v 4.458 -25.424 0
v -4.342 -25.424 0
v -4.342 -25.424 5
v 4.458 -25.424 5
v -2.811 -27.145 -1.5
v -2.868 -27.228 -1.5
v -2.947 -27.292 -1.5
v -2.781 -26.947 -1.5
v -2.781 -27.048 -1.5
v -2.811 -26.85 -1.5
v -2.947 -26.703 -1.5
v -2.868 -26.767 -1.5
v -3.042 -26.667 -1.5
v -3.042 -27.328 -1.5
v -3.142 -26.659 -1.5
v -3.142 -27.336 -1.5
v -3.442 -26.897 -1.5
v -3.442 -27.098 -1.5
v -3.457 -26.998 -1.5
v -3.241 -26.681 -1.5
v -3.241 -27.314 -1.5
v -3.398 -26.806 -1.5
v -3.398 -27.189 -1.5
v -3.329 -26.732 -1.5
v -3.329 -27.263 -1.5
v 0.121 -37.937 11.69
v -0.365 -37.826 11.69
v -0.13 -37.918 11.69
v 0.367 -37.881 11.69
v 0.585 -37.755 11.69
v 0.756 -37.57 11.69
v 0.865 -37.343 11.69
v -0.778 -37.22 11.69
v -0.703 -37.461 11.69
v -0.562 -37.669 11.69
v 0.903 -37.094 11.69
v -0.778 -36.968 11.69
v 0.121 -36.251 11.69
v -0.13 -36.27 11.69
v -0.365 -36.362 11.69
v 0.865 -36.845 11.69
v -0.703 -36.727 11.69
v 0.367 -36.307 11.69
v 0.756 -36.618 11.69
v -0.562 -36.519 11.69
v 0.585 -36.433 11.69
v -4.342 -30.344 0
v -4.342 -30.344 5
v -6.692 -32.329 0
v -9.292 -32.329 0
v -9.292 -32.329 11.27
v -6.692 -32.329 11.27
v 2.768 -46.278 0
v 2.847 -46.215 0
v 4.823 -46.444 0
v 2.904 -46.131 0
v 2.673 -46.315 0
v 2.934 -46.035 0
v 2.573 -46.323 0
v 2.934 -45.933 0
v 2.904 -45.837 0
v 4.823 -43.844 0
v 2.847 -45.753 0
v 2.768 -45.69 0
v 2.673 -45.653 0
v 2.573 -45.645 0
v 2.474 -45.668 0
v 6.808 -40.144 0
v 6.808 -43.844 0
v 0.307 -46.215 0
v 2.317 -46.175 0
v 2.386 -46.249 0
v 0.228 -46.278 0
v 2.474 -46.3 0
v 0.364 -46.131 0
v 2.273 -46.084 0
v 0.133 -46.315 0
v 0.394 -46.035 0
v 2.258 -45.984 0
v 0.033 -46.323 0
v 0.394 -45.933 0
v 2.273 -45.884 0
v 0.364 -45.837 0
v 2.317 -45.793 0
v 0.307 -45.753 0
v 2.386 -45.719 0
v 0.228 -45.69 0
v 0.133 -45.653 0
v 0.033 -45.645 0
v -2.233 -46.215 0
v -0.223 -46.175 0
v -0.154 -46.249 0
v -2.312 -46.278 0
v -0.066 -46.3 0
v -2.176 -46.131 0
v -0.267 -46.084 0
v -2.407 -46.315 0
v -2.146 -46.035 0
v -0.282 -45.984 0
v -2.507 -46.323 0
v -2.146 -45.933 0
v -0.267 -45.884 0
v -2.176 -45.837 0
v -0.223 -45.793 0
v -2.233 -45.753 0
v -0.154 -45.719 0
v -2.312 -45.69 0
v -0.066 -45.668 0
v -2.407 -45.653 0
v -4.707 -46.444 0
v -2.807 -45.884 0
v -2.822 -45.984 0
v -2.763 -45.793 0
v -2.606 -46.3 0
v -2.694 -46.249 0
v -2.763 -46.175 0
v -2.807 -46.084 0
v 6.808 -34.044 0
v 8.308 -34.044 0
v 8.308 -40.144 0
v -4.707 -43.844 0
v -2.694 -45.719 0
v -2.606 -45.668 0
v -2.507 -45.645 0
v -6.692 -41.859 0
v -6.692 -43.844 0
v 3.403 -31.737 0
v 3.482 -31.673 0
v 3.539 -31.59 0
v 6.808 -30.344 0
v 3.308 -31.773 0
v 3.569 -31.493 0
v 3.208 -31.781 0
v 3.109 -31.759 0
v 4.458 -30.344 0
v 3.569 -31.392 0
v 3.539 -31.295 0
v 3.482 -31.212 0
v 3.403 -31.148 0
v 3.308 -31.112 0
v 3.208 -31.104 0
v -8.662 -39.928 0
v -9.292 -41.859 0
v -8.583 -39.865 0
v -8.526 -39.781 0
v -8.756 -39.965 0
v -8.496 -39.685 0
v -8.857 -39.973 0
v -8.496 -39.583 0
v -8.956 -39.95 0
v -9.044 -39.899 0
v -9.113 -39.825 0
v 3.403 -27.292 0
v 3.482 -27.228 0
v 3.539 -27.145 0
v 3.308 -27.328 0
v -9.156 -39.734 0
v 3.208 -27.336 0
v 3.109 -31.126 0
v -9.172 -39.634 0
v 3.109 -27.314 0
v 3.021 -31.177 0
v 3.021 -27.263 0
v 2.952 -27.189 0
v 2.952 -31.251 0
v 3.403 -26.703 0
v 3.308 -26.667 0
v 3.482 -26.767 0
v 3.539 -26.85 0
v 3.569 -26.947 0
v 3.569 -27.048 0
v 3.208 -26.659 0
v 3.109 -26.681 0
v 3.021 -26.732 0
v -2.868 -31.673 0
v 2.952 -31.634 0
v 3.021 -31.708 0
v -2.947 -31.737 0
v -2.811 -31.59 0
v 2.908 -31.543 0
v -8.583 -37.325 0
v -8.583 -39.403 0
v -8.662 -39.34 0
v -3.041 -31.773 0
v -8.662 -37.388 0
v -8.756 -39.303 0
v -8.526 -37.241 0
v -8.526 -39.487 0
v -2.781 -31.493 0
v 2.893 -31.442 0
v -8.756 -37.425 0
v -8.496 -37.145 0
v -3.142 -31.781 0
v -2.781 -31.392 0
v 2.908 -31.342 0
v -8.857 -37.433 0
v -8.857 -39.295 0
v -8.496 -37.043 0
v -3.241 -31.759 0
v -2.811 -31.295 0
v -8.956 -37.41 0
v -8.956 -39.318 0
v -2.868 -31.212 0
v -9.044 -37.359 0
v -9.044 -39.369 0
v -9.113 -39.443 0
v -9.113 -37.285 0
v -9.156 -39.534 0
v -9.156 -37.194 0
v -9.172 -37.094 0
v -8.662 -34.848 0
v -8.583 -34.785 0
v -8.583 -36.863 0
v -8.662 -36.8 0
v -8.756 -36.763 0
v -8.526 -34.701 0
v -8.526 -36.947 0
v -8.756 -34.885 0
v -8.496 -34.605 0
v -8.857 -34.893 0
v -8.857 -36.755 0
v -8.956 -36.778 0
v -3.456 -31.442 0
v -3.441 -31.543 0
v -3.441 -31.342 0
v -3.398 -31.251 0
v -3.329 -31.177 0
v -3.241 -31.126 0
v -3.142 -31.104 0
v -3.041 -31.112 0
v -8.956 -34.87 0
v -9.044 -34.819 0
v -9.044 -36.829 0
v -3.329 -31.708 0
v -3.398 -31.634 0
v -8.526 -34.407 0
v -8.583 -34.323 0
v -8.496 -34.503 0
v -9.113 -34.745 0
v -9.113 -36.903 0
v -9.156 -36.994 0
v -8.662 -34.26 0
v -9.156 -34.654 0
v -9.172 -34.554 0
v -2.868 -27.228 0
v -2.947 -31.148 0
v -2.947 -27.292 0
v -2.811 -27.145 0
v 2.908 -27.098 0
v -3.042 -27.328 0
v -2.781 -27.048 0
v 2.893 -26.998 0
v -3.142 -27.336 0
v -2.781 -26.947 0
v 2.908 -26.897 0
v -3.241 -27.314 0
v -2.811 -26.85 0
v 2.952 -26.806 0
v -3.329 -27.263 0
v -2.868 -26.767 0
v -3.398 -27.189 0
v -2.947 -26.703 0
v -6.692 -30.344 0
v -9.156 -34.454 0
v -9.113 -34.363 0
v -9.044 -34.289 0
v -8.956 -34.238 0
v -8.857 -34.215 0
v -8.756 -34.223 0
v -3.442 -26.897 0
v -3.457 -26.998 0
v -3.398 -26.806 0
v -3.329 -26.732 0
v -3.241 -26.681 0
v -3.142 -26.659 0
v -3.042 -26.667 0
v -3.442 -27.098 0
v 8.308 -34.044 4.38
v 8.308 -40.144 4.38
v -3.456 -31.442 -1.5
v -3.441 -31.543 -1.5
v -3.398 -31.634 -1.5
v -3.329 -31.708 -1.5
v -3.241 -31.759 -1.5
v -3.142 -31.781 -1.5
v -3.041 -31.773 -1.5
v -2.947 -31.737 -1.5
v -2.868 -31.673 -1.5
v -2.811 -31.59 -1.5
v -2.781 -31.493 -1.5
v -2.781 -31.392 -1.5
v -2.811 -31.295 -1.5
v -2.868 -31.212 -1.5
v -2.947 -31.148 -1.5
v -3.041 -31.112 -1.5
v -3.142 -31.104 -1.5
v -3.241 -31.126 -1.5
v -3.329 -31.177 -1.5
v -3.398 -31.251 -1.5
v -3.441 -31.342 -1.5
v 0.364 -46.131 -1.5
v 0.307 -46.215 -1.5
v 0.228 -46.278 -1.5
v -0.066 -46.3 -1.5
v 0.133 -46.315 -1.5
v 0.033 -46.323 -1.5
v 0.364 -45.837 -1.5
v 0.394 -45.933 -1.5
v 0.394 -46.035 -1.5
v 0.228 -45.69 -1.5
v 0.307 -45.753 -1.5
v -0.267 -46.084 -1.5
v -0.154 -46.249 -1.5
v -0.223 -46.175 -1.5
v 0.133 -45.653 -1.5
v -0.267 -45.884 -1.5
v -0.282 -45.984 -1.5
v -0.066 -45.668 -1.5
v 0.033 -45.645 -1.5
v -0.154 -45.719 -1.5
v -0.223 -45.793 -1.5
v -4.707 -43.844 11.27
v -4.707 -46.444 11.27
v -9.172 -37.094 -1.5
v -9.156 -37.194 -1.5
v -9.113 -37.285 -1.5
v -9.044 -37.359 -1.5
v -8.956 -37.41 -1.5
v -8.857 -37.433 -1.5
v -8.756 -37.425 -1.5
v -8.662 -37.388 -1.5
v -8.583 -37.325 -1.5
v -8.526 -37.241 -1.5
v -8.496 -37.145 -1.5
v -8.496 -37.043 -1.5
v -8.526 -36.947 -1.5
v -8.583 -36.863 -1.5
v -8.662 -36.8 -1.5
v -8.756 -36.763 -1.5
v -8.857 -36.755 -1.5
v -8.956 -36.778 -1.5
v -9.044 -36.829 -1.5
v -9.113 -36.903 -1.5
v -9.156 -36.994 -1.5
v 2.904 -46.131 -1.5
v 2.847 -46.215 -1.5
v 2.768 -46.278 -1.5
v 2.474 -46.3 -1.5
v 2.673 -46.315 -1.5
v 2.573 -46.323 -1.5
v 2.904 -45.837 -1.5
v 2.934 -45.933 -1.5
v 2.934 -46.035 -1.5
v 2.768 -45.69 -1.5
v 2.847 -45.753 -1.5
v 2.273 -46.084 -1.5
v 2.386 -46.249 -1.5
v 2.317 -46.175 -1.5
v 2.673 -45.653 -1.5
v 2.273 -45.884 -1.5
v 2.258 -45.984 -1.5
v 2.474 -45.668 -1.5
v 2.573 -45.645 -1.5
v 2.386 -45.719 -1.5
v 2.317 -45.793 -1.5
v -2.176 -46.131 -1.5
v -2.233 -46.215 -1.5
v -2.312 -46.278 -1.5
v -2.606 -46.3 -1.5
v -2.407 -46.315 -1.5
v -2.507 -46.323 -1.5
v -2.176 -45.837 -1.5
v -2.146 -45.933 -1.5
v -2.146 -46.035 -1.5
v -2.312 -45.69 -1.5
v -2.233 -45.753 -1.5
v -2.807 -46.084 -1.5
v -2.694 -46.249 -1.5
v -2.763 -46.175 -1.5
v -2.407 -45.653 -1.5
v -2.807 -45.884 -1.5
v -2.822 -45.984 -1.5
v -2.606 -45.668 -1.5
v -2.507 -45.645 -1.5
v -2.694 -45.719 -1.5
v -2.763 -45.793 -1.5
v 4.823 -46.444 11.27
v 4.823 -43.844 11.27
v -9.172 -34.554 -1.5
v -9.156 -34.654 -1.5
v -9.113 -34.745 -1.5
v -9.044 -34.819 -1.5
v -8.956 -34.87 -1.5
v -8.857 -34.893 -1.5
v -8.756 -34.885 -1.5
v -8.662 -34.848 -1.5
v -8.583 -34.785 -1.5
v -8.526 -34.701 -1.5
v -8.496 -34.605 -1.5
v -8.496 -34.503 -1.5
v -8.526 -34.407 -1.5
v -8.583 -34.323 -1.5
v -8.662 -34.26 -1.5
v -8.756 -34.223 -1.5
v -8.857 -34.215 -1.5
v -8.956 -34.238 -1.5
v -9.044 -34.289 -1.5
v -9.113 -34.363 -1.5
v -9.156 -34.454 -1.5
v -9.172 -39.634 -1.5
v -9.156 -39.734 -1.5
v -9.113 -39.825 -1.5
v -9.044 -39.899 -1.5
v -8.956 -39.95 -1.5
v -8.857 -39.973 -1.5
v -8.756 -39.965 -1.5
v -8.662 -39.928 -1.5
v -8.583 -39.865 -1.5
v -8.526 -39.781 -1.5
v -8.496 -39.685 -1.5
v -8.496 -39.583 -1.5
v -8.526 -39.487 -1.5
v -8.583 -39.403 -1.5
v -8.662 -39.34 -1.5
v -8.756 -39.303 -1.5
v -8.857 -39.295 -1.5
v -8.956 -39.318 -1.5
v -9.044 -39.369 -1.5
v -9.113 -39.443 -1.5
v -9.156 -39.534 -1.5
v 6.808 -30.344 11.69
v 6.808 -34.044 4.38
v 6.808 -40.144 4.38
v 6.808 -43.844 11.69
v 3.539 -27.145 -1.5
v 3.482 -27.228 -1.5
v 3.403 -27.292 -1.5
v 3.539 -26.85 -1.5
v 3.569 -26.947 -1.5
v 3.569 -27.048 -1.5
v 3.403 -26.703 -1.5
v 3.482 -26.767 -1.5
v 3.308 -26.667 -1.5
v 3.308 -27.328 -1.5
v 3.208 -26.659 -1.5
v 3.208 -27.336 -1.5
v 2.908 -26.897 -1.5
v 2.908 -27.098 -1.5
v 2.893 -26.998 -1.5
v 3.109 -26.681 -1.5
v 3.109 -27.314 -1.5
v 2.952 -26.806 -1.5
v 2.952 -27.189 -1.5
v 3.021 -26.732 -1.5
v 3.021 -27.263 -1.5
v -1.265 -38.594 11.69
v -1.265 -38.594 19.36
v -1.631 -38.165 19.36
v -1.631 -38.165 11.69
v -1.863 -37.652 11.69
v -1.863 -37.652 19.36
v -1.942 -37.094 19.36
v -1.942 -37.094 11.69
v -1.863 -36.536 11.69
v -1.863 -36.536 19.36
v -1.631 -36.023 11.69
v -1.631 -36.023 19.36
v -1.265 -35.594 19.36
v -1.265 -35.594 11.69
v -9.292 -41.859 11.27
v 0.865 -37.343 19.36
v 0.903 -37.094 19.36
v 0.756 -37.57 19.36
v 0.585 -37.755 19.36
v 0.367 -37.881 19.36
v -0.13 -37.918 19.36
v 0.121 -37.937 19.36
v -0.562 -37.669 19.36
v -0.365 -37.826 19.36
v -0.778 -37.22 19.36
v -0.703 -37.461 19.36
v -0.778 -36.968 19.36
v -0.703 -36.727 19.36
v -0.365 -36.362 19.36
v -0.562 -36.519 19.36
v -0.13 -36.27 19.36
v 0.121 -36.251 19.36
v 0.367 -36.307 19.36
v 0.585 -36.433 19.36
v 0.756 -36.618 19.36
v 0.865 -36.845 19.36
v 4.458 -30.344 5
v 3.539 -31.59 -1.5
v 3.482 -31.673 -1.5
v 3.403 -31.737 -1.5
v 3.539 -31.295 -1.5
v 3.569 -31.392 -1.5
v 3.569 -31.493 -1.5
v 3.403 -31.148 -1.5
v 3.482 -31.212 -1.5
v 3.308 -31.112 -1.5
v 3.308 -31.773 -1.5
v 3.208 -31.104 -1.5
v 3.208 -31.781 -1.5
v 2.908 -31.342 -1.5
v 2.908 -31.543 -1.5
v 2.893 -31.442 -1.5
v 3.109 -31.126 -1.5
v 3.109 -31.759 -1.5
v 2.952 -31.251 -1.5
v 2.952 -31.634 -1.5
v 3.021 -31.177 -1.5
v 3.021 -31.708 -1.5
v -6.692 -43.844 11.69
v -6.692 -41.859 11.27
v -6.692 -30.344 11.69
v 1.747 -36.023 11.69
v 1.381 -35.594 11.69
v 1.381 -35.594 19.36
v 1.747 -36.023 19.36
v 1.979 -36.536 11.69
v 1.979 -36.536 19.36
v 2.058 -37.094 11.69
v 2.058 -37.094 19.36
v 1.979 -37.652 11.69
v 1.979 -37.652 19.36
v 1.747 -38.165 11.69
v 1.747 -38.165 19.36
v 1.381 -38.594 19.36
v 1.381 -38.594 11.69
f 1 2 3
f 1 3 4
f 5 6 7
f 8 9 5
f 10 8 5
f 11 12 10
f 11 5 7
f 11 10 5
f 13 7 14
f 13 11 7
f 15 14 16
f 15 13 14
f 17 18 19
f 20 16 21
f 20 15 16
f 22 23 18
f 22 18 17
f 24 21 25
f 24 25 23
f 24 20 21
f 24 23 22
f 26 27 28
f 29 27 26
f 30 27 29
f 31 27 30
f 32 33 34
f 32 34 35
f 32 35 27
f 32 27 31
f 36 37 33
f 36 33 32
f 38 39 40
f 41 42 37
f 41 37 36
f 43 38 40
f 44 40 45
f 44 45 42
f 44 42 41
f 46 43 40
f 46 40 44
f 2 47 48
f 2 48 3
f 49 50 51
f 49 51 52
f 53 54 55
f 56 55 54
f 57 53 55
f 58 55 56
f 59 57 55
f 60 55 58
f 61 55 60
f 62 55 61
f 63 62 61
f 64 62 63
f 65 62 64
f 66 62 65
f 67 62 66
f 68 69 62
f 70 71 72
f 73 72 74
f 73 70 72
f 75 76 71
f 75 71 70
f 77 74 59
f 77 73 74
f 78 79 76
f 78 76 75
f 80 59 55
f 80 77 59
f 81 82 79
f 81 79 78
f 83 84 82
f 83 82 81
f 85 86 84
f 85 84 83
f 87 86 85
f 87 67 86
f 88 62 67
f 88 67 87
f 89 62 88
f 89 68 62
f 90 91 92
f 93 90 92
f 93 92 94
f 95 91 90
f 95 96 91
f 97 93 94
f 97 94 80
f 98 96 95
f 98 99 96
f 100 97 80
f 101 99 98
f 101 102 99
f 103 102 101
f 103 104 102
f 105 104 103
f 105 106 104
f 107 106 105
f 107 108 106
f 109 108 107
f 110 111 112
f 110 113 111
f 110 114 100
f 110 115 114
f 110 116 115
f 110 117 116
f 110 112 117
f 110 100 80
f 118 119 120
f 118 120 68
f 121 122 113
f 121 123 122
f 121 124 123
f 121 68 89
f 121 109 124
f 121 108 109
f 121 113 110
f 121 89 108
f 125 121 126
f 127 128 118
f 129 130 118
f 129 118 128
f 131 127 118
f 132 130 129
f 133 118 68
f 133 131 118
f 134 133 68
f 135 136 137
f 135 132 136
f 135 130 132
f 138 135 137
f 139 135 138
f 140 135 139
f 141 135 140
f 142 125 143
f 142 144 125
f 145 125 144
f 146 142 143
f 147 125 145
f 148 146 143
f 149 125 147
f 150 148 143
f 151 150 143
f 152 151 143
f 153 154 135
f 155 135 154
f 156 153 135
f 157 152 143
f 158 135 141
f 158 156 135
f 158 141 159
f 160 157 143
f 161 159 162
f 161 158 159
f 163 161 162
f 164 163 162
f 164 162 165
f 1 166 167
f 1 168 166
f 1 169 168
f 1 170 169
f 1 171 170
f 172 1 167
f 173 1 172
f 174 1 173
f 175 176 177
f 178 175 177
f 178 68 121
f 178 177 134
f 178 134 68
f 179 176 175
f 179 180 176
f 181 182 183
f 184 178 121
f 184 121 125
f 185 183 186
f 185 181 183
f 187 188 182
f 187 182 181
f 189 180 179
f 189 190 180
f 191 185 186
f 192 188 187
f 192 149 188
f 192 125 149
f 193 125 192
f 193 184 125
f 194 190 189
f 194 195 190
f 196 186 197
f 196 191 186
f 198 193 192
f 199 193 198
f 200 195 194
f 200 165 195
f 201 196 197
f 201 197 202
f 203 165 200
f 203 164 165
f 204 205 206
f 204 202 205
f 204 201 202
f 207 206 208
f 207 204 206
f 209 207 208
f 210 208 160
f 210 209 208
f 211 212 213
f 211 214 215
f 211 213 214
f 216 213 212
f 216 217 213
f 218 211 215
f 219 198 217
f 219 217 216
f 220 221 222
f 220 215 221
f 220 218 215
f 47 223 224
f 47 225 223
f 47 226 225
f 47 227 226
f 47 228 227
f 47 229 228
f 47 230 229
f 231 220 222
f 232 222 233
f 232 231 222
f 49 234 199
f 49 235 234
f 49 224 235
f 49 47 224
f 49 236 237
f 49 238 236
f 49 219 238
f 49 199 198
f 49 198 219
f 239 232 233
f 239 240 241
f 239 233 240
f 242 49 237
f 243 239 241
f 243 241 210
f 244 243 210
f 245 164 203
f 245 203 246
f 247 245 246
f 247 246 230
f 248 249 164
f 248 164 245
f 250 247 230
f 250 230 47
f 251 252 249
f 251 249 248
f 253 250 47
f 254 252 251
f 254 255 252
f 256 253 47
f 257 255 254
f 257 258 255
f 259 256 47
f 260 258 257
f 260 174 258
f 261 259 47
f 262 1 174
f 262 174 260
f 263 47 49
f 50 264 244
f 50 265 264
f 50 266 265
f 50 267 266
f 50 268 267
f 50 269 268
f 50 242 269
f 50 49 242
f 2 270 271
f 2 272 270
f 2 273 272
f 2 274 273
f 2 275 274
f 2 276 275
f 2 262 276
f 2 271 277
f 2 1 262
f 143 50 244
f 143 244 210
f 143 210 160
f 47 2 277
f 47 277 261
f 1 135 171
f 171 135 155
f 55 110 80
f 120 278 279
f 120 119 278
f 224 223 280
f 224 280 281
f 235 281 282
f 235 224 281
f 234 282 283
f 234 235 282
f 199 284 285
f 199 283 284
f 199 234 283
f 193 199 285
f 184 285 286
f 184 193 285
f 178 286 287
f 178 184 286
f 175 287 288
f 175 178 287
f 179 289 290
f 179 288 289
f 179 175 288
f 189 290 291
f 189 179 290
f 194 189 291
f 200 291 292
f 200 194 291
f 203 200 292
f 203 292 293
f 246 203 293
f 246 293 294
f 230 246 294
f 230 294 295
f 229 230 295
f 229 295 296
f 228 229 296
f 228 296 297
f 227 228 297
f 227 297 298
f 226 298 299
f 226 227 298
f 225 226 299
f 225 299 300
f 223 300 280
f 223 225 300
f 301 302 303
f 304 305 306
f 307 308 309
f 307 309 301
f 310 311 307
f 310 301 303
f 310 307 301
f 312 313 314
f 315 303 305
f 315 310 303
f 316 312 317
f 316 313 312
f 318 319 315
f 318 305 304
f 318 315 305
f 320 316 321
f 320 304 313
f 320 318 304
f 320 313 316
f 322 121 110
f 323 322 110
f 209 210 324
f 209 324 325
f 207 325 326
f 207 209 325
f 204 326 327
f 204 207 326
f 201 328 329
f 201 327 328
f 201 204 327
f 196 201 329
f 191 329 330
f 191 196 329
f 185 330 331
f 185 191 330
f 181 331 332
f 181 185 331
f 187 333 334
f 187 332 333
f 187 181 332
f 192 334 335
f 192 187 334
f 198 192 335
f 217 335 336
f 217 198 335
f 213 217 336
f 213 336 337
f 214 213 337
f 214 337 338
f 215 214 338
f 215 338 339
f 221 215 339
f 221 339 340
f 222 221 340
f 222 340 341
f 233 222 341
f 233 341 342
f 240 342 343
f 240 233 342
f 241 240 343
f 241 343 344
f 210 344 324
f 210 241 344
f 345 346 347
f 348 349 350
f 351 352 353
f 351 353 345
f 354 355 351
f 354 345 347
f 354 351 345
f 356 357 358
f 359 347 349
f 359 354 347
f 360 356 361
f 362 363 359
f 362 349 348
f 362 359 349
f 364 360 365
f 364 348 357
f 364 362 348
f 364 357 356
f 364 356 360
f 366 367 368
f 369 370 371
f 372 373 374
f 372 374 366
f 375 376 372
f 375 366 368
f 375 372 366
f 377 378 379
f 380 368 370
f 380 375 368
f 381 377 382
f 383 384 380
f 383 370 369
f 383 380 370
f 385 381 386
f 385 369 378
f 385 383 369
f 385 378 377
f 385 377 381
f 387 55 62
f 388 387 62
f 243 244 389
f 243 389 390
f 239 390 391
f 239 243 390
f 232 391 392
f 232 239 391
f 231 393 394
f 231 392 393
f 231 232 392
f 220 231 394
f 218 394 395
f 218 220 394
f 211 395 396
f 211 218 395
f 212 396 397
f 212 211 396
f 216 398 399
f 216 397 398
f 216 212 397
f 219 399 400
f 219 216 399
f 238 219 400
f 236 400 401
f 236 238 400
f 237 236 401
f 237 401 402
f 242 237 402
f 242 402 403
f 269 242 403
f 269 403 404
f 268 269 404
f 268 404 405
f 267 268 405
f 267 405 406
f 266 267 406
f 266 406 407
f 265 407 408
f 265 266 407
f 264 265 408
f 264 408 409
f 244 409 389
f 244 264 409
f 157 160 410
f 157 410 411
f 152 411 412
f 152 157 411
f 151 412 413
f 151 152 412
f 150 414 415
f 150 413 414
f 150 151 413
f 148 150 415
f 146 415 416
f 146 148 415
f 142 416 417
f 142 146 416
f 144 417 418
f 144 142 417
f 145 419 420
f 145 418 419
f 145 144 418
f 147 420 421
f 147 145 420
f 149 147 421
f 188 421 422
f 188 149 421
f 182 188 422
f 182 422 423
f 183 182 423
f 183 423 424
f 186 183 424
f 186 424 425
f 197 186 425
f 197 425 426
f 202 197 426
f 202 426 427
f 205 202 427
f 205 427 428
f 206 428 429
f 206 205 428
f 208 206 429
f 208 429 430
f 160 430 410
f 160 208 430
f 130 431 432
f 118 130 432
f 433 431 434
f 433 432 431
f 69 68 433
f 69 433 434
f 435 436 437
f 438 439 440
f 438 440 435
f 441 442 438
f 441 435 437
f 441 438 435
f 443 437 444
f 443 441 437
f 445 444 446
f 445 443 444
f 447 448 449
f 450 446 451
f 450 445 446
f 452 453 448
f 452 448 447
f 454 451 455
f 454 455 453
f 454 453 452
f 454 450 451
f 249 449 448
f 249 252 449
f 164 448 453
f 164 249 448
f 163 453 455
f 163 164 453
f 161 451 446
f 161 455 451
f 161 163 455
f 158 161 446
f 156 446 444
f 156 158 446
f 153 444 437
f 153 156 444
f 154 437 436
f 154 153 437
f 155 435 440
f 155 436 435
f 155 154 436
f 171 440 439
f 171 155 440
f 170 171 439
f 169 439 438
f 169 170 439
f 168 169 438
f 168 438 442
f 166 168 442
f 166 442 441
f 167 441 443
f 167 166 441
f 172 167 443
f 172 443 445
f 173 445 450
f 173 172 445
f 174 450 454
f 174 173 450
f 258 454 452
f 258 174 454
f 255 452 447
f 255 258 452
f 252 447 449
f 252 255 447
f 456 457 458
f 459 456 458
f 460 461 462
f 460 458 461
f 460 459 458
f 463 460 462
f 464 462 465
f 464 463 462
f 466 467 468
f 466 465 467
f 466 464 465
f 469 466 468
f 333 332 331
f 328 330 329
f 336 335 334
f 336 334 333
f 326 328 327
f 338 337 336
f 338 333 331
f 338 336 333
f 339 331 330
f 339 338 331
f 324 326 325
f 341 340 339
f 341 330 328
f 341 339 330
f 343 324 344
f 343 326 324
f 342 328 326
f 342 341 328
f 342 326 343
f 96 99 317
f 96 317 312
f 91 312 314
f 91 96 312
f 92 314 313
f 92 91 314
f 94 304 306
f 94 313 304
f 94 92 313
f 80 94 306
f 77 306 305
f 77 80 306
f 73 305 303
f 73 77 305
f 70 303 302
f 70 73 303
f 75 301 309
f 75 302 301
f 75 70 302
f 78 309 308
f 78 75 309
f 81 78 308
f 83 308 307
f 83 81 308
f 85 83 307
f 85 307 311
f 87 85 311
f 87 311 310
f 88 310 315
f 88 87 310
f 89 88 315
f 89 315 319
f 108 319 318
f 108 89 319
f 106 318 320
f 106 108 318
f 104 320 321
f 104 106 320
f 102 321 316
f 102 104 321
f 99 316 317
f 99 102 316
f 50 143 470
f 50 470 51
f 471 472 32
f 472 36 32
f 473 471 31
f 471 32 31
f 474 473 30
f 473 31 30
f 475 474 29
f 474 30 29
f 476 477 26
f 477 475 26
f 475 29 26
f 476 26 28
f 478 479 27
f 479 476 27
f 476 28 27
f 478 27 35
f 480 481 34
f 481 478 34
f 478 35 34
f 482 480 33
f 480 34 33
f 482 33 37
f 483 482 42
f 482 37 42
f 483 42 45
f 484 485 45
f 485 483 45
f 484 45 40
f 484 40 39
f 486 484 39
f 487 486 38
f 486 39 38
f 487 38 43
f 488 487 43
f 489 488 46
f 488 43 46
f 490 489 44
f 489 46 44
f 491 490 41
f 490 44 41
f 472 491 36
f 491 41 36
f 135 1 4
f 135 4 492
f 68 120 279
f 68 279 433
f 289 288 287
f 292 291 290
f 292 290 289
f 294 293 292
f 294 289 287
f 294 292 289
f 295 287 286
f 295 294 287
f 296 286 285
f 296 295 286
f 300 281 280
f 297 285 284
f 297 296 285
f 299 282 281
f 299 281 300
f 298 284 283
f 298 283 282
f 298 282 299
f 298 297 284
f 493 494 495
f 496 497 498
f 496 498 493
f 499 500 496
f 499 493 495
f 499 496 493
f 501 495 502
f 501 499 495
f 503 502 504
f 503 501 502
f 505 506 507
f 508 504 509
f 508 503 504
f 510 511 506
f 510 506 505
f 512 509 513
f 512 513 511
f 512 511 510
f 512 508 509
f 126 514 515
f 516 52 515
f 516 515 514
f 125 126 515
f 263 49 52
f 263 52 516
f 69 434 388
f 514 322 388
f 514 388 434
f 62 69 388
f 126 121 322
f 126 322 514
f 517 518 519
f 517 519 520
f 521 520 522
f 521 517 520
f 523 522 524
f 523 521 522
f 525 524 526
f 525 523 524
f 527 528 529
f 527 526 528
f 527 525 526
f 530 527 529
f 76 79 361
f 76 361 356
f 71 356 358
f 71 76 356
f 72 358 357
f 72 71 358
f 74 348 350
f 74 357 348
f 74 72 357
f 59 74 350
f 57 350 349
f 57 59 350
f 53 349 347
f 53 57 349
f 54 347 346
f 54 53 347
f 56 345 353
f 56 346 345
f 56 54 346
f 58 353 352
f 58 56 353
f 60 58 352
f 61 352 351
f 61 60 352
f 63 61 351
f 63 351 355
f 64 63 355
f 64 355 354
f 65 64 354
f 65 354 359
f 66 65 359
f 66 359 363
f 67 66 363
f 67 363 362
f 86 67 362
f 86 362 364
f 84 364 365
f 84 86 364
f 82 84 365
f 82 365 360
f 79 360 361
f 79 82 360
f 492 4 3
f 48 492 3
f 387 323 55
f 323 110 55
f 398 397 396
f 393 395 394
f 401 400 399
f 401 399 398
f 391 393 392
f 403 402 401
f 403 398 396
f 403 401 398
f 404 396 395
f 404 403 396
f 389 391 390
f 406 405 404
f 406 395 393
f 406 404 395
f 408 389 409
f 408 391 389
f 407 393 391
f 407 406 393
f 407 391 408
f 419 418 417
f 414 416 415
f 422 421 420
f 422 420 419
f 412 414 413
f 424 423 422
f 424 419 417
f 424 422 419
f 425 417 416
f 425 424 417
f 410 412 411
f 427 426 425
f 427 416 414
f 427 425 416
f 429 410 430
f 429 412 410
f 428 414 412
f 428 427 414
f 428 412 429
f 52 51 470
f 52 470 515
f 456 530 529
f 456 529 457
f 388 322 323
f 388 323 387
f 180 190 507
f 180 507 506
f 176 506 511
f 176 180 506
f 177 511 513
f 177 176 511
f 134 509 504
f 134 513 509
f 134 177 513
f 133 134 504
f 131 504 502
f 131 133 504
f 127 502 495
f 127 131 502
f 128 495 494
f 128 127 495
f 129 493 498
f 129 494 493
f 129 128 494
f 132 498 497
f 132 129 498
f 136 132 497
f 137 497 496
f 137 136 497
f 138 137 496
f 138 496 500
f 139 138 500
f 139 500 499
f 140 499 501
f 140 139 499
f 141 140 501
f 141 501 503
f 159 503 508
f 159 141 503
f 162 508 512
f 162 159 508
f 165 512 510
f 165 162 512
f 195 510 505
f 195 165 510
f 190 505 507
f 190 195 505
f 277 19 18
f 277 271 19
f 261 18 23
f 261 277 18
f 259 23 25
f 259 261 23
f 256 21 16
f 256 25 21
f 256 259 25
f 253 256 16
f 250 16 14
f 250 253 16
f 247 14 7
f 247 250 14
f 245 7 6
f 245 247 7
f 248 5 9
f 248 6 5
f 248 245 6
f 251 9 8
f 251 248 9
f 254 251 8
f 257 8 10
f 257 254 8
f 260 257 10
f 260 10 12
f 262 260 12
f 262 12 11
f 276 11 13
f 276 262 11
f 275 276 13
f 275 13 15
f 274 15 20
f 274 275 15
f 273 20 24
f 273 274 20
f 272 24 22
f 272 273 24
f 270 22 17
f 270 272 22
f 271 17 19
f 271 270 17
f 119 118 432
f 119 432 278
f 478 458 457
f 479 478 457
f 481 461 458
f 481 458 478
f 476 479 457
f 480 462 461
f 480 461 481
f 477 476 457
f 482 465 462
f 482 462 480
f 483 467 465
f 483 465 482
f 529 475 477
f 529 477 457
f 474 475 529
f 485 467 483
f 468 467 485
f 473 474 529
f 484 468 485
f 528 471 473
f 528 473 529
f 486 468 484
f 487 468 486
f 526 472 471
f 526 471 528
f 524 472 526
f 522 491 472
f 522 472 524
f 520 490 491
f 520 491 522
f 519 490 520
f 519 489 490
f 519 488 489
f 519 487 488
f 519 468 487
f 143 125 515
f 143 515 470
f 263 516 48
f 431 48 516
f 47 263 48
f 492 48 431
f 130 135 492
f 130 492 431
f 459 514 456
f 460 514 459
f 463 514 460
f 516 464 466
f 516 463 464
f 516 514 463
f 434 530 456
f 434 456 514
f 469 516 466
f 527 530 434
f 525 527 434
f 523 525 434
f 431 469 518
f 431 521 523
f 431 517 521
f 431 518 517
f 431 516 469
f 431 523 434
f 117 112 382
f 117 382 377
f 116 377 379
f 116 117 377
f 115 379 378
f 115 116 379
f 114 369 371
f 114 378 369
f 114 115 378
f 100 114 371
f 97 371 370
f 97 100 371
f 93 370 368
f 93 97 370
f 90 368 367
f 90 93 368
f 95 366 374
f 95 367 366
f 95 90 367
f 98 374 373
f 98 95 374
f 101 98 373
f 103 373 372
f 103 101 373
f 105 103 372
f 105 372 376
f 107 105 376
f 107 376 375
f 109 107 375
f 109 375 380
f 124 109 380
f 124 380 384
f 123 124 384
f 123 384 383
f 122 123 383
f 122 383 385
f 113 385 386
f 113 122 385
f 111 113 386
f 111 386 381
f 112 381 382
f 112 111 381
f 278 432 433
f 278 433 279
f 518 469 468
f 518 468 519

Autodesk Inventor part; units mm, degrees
sketch "Sketch1" plane through (0, 0, 0) normal (0, 0, 1) x (1, 0, 0)
  line L0 (-6.6921, -30.344) -> (6.8079, -30.344)
  line L1 (6.8079, -30.344) -> (6.8079, -43.844)
  line L2 (6.8079, -43.844) -> (-6.6921, -43.844)
  line L3 (-6.6921, -43.844) -> (-6.6921, -30.344)
  line L4 (-6.6921, -30.344) -> (6.8079, -43.844) construction
  line L5 (6.8079, -30.344) -> (-6.6921, -43.844) construction
  line L6 (-4.7071, -46.444) -> (4.8229, -46.444)
  line L7 (4.8229, -46.444) -> (4.8229, -43.844)
  line L8 (4.8229, -43.844) -> (-4.7071, -43.844)
  line L9 (-4.7071, -43.844) -> (-4.7071, -46.444)
  line L10 (-9.2921, -32.329) -> (-6.6921, -32.329)
  line L11 (-6.6921, -32.329) -> (-6.6921, -41.859)
  line L12 (-6.6921, -41.859) -> (-9.2921, -41.859)
  line L13 (-9.2921, -41.859) -> (-9.2921, -32.329)
  line L14 (6.8079, -34.044) -> (8.3079, -34.044)
  line L15 (8.3079, -34.044) -> (8.3079, -40.144)
  line L16 (8.3079, -40.144) -> (6.8079, -40.144)
  line L17 (6.8079, -40.144) -> (6.8079, -34.044)
  point P0 (0, 0)
  point P1 (0.0579, -37.094)
  point P2 (0.0579, -43.844)
  point P3 (-6.6921, -37.094)
  point P4 (-6.6921, -37.094)
  point P5 (-9.2921, -37.094)
  point P6 (6.8079, -37.094)
  point P7 (8.3079, -37.094)
  point P8 (8.3079, -37.094)
  point P9 (6.8079, -37.094)
  dimension "d0" = 13.5
  dimension "d1" = 13.5
  dimension "d3" = 9.53
  dimension "d4" = 2.6
  dimension "d7" = 2.6
  dimension "d8" = 9.53
  dimension "d19" = 1.5
  dimension "d20" = 6.1
extrude "Extrusion1" add sketch "Sketch1" along normal blind 11.69 contours L0 L1 L2 L3
ref_plane "Work Plane2" through (0, 0, 0) normal (0, 0, 1) x (1, 0, 0)
ref_plane "Work Plane3" through (0, 0, 0) normal (0, 0, 1) x (1, 0, 0)
sketch "Sketch3" plane through (0, 0, 0) normal (0, 0, 1) x (1, 0, 0)
  line L0 (-6.6921, -30.344) -> (6.8079, -30.344)
  line L1 (6.8079, -30.344) -> (6.8079, -43.844)
  line L2 (6.8079, -43.844) -> (-6.6921, -43.844)
  line L3 (-6.6921, -43.844) -> (-6.6921, -30.344)
  line L4 (-6.6921, -30.344) -> (6.8079, -43.844) construction
  line L5 (6.8079, -30.344) -> (-6.6921, -43.844) construction
  line L6 (-4.7071, -46.444) -> (4.8229, -46.444)
  line L7 (4.8229, -46.444) -> (4.8229, -43.844)
  line L8 (4.8229, -43.844) -> (-4.7071, -43.844)
  line L9 (-4.7071, -43.844) -> (-4.7071, -46.444)
  line L10 (-9.2921, -32.329) -> (-6.6921, -32.329)
  line L11 (-6.6921, -32.329) -> (-6.6921, -41.859)
  line L12 (-6.6921, -41.859) -> (-9.2921, -41.859)
  line L13 (-9.2921, -41.859) -> (-9.2921, -32.329)
  line L14 (6.8079, -34.044) -> (8.3079, -34.044)
  line L15 (8.3079, -34.044) -> (8.3079, -40.144)
  line L16 (8.3079, -40.144) -> (6.8079, -40.144)
  line L17 (6.8079, -40.144) -> (6.8079, -34.044)
  point P0 (0, 0)
  point P1 (0, 0)
  point P2 (0.0579, -37.094)
  point P3 (0.0579, -43.844)
  point P4 (-6.6921, -37.094)
  point P5 (-6.6921, -37.094)
  point P6 (-9.2921, -37.094)
  point P7 (6.8079, -37.094)
  point P8 (6.8079, -37.094)
  point P9 (8.3079, -37.094)
  point P10 (8.3079, -37.094)
  dimension "d21" = 13.5
  dimension "d22" = 13.5
  dimension "d23" = 9.53
  dimension "d24" = 2.6
  dimension "d25" = 2.6
  dimension "d26" = 9.53
  dimension "d27" = 1.5
  dimension "d28" = 6.1
extrude "Extrusion2" add sketch "Sketch3" along normal blind 11.27 contours L3 L12 L13 L10 | L2 L7 L6 L9
ref_plane "Work Plane4" through (0, 0, 0) normal (0, 0, 1) x (1, 0, 0)
sketch "Sketch4" plane through (0, 0, 0) normal (0, 0, 1) x (1, 0, 0)
  line L0 (-6.6921, -30.344) -> (6.8079, -30.344)
  line L1 (6.8079, -30.344) -> (6.8079, -43.844)
  line L2 (6.8079, -43.844) -> (-6.6921, -43.844)
  line L3 (-6.6921, -43.844) -> (-6.6921, -30.344)
  line L4 (-6.6921, -30.344) -> (6.8079, -43.844) construction
  line L5 (6.8079, -30.344) -> (-6.6921, -43.844) construction
  line L6 (-4.7071, -46.444) -> (4.8229, -46.444)
  line L7 (4.8229, -46.444) -> (4.8229, -43.844)
  line L8 (4.8229, -43.844) -> (-4.7071, -43.844)
  line L9 (-4.7071, -43.844) -> (-4.7071, -46.444)
  line L10 (-9.2921, -32.329) -> (-6.6921, -32.329)
  line L11 (-6.6921, -32.329) -> (-6.6921, -41.859)
  line L12 (-6.6921, -41.859) -> (-9.2921, -41.859)
  line L13 (-9.2921, -41.859) -> (-9.2921, -32.329)
  line L14 (6.8079, -34.044) -> (8.3079, -34.044)
  line L15 (8.3079, -34.044) -> (8.3079, -40.144)
  line L16 (8.3079, -40.144) -> (6.8079, -40.144)
  line L17 (6.8079, -40.144) -> (6.8079, -34.044)
  point P0 (0, 0)
  point P1 (0, 0)
  point P2 (0, 0)
  point P3 (6.8079, -37.094)
  point P4 (0.0579, -43.844)
  point P5 (-6.6921, -37.094)
  point P6 (0.0579, -37.094)
  point P7 (-6.6921, -37.094)
  point P8 (-9.2921, -37.094)
  point P9 (8.3079, -37.094)
  point P10 (6.8079, -37.094)
  point P11 (8.3079, -37.094)
  dimension "d31" = 13.5
  dimension "d32" = 13.5
  dimension "d33" = 9.53
  dimension "d34" = 2.6
  dimension "d35" = 2.6
  dimension "d36" = 9.53
  dimension "d37" = 1.5
  dimension "d38" = 6.1
extrude "Extrusion3" add sketch "Sketch4" along normal blind 4.38 contours L14 L15 L16 L1
sketch "Sketch5" plane through (0, 0, 11.69) normal (0, 0, 1) x (1, 0, 0)
  line L0 (-6.6921, -30.344) -> (-6.6921, -43.844) projected
  line L1 (-6.6921, -43.844) -> (6.8079, -43.844) projected
  line L2 (6.8079, -43.844) -> (6.8079, -30.344) projected
  line L3 (6.8079, -30.344) -> (-6.6921, -30.344) projected
  line L4 (6.8079, -30.344) -> (-6.6921, -30.344) projected
  line L5 (6.8079, -43.844) -> (6.8079, -40.144) projected
  line L6 (-6.6921, -30.344) -> (-6.6921, -32.329) projected
  line L7 (1.3808, -38.594) -> (-1.2649, -38.594)
  line L8 (-1.2649, -35.594) -> (1.3808, -35.594)
  arc A0 (1.3808, -38.594) -> (1.3808, -35.594) centre (0.0579, -37.094) ccw
  arc A1 (-1.2649, -35.594) -> (-1.2649, -38.594) centre (0.0579, -37.094) ccw
  circle A2 centre (0.0579, -37.094) radius 0.845
  point P0 (0, 0)
  dimension "d44" = 1.69
extrude "Extrusion4" add sketch "Sketch5" along normal blind 7.67 contours L7 A1 L8 A0
sketch "Sketch6" plane through (0, 0, 0) normal (0, 0, -1) x (-1, 0, 0)
  circle A0 centre (2.4821, -45.984) radius 0.3395 projected
  circle A1 centre (8.832, -39.634) radius 0.3395 projected
  circle A2 centre (8.832, -37.094) radius 0.3395 projected
  circle A3 centre (8.832, -34.554) radius 0.3395 projected
  circle A4 centre (-0.0579, -45.984) radius 0.3395 projected
  circle A5 centre (-2.5979, -45.984) radius 0.3395 projected
  circle A6 centre (-3.2329, -31.4425) radius 0.3395 projected
  circle A7 centre (-3.2329, -26.9975) radius 0.3395 projected
  circle A8 centre (3.117, -31.4425) radius 0.3395 projected
  circle A9 centre (3.1171, -26.9975) radius 0.3395 projected
  point P0 (0, 0)
extrude "Extrusion5" add sketch "Sketch6" along normal blind 1.5
sketch "Sketch7" plane through (0, 0, 0) normal (0, 0, -1) x (-1, 0, 0)
  line L0 (-4.4579, -30.344) -> (4.3421, -30.344)
  line L1 (4.3421, -30.344) -> (4.3421, -25.424)
  line L2 (4.3421, -25.424) -> (-4.4579, -25.424)
  line L3 (-4.4579, -25.424) -> (-4.4579, -30.344)
  line L4 (-6.8079, -30.344) -> (6.6921, -30.344) projected
  point P0 (0, 0)
  point P1 (-0.0579, -30.344)
  point P2 (-0.0579, -30.344)
  dimension "d49" = 8.8
  dimension "d50" = 4.92
extrude "Extrusion6" add sketch "Sketch7" against normal blind 5
properties part number "Joystick"
